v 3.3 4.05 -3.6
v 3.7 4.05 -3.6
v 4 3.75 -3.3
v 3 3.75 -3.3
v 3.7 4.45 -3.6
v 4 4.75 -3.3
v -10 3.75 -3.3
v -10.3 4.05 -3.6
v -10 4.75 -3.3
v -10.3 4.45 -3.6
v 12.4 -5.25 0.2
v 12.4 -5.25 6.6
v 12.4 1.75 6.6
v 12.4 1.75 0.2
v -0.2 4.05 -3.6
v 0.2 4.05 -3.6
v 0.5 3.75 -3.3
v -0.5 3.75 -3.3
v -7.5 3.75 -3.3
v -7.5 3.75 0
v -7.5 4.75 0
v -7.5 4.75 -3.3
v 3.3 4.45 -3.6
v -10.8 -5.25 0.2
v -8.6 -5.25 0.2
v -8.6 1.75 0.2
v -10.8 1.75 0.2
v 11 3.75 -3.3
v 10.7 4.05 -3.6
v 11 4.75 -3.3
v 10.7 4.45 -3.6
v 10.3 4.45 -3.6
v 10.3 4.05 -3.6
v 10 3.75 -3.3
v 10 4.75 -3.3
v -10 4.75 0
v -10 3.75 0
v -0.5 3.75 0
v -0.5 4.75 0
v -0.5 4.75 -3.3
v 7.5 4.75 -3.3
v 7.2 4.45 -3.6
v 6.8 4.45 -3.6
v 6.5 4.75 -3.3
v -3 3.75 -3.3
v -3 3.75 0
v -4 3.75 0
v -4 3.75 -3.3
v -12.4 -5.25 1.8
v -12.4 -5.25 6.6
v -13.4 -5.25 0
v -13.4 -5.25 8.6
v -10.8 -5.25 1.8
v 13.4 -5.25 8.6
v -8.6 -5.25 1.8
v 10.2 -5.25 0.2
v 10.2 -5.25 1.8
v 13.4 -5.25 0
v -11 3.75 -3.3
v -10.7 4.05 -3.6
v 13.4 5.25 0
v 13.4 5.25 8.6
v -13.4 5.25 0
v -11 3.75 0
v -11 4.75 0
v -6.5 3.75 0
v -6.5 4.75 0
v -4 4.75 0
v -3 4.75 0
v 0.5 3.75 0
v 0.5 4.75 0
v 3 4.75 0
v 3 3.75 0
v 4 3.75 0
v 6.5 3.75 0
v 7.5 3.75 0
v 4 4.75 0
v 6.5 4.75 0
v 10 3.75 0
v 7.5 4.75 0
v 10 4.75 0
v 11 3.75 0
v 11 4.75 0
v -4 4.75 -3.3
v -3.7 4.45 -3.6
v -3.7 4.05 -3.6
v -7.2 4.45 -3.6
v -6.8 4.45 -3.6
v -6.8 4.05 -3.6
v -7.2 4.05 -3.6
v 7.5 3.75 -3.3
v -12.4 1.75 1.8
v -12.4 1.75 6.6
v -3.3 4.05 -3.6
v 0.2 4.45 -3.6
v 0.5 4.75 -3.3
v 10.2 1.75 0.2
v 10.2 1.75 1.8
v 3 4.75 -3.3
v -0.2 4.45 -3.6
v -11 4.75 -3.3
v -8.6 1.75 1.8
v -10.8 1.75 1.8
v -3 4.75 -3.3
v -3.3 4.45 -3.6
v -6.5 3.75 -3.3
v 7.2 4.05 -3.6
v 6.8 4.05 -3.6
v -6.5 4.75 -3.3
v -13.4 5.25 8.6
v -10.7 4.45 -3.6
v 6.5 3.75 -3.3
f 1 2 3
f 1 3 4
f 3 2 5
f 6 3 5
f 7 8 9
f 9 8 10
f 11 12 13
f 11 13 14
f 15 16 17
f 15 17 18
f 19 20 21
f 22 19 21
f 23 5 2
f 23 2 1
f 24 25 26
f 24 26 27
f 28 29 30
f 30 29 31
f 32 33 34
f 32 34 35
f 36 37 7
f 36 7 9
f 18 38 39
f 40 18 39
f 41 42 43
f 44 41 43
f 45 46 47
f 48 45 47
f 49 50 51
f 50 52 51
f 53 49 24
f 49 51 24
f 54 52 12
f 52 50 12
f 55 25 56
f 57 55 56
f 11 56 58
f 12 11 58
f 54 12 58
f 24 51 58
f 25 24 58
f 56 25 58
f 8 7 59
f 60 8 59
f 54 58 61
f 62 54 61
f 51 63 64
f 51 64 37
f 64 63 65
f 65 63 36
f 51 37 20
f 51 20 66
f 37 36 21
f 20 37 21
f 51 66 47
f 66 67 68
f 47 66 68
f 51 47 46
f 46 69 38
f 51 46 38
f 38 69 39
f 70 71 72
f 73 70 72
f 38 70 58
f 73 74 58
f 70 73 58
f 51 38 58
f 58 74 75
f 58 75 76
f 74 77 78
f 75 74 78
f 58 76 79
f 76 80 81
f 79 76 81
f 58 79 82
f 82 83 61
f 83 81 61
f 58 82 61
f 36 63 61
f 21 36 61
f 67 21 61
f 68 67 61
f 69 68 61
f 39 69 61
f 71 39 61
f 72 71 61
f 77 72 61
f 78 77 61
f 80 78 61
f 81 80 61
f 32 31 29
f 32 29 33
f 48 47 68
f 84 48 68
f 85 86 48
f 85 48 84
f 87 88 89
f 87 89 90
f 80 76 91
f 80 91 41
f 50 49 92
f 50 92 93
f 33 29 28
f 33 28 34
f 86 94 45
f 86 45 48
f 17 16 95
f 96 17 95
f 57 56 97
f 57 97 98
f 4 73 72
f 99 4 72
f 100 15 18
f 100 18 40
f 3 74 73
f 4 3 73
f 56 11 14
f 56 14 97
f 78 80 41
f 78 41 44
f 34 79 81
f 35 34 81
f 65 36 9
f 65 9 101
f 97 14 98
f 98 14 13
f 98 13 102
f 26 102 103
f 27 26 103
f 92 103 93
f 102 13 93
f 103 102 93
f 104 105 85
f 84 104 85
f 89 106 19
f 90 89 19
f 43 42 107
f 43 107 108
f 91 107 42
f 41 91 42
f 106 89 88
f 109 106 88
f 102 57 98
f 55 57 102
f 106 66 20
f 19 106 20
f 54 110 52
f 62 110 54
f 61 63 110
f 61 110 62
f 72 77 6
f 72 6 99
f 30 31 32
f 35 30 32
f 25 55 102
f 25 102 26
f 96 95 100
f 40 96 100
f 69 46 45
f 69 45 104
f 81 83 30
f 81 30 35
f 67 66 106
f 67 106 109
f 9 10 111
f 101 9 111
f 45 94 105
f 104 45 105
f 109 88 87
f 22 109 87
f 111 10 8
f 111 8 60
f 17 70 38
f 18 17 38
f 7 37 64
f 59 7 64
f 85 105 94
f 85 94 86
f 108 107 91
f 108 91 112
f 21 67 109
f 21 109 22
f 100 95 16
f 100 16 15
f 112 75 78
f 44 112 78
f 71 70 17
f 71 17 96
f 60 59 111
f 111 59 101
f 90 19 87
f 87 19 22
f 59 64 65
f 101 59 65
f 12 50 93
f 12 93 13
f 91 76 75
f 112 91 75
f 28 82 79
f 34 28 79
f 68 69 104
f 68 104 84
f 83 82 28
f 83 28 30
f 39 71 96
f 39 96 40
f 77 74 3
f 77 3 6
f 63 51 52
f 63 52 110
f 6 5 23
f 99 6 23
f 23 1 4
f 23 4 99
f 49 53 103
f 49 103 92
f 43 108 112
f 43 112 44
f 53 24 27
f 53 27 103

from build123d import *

# Parameters (mm, degrees)
SKETCH_1_W                         = 26.8
SKETCH_1_H                         = 10.5
EXTRUDE_1_DEPTH                    = 8.6
CUT_EXTRUDE_1_DEPTH                = 7
EXTRUDE_START                      = -5
SKETCH_3_W                         = 1
SKETCH_3_H                         = 1
EXTRUDE_2_DEPTH                    = 8.6
CHAMFER_1_SIZE                     = 0.3
PATTERN_LINEAR_1_COUNT             = 7
PATTERN_LINEAR_1_PITCH             = 3.5
CHAMFER_1_OF_PATTERN_LINEAR_1_SIZE = 0.3


with BuildPart() as part:
    # Эскиз1 → Бобышка-Вытянуть1 (new body)
    with BuildSketch(Plane.XY):
        Rectangle(SKETCH_1_W, SKETCH_1_H)
    extrude(amount=EXTRUDE_1_DEPTH)

    # Эскиз2 → Вырез-Вытянуть1 (cut)
    with BuildSketch(Plane.XZ.offset(5.25)):
        Polygon((-12.4, 6.6), (12.4, 6.6), (12.4, 0.2), (10.2, 0.2), (10.2, 1.8), (-8.6, 1.8), (-8.6, 0.2), (-10.8, 0.2), (-10.8, 1.8), (-12.4, 1.8), align=None)
    extrude(amount=-CUT_EXTRUDE_1_DEPTH, mode=Mode.SUBTRACT)

    # Эскиз3 → Бобышка-Вытянуть2 (add)
    with BuildSketch(Plane(origin=(0, 0, 0), x_dir=(-1, 0, 0), z_dir=(0, 0, -1)).offset(EXTRUDE_START)):
        with Locations((10.5, 4.25)):
            Rectangle(SKETCH_3_W, SKETCH_3_H)
    extrude_2 = extrude(amount=EXTRUDE_2_DEPTH)

    # Фаска1
    chamfer_1_edges = [part.edges().sort_by_distance(p)[0] for p in [
        (-10, 4.25, -3.6),
        (-10.5, 3.75, -3.6),
        (-11, 4.25, -3.6),
        (-10.5, 4.75, -3.6),
    ]]
    chamfer(chamfer_1_edges, length=CHAMFER_1_SIZE)

    # Линейный массив1: Бобышка-Вытянуть2 ×7
    with Locations(*[(i * PATTERN_LINEAR_1_PITCH, 0, 0) for i in range(1, PATTERN_LINEAR_1_COUNT)]):
        add(extrude_2)

    # Фаска1 of Линейный массив1
    chamfer_1_of_pattern_linear_1_edges = [part.edges().sort_by_distance(p)[0] for p in [
        (-6.5, 4.25, -3.6),
        (-7, 3.75, -3.6),
        (-7.5, 4.25, -3.6),
        (-7, 4.75, -3.6),
        (-3, 4.25, -3.6),
        (-3.5, 3.75, -3.6),
        (-4, 4.25, -3.6),
        (-3.5, 4.75, -3.6),
        (0.5, 4.25, -3.6),
        (0, 3.75, -3.6),
        (-0.5, 4.25, -3.6),
        (0, 4.75, -3.6),
        (4, 4.25, -3.6),
        (3.5, 3.75, -3.6),
        (3, 4.25, -3.6),
        (3.5, 4.75, -3.6),
        (7.5, 4.25, -3.6),
        (7, 3.75, -3.6),
        (6.5, 4.25, -3.6),
        (7, 4.75, -3.6),
        (11, 4.25, -3.6),
        (10.5, 3.75, -3.6),
        (10, 4.25, -3.6),
        (10.5, 4.75, -3.6),
    ]]
    chamfer(chamfer_1_of_pattern_linear_1_edges, length=CHAMFER_1_OF_PATTERN_LINEAR_1_SIZE)


solid = part.part
